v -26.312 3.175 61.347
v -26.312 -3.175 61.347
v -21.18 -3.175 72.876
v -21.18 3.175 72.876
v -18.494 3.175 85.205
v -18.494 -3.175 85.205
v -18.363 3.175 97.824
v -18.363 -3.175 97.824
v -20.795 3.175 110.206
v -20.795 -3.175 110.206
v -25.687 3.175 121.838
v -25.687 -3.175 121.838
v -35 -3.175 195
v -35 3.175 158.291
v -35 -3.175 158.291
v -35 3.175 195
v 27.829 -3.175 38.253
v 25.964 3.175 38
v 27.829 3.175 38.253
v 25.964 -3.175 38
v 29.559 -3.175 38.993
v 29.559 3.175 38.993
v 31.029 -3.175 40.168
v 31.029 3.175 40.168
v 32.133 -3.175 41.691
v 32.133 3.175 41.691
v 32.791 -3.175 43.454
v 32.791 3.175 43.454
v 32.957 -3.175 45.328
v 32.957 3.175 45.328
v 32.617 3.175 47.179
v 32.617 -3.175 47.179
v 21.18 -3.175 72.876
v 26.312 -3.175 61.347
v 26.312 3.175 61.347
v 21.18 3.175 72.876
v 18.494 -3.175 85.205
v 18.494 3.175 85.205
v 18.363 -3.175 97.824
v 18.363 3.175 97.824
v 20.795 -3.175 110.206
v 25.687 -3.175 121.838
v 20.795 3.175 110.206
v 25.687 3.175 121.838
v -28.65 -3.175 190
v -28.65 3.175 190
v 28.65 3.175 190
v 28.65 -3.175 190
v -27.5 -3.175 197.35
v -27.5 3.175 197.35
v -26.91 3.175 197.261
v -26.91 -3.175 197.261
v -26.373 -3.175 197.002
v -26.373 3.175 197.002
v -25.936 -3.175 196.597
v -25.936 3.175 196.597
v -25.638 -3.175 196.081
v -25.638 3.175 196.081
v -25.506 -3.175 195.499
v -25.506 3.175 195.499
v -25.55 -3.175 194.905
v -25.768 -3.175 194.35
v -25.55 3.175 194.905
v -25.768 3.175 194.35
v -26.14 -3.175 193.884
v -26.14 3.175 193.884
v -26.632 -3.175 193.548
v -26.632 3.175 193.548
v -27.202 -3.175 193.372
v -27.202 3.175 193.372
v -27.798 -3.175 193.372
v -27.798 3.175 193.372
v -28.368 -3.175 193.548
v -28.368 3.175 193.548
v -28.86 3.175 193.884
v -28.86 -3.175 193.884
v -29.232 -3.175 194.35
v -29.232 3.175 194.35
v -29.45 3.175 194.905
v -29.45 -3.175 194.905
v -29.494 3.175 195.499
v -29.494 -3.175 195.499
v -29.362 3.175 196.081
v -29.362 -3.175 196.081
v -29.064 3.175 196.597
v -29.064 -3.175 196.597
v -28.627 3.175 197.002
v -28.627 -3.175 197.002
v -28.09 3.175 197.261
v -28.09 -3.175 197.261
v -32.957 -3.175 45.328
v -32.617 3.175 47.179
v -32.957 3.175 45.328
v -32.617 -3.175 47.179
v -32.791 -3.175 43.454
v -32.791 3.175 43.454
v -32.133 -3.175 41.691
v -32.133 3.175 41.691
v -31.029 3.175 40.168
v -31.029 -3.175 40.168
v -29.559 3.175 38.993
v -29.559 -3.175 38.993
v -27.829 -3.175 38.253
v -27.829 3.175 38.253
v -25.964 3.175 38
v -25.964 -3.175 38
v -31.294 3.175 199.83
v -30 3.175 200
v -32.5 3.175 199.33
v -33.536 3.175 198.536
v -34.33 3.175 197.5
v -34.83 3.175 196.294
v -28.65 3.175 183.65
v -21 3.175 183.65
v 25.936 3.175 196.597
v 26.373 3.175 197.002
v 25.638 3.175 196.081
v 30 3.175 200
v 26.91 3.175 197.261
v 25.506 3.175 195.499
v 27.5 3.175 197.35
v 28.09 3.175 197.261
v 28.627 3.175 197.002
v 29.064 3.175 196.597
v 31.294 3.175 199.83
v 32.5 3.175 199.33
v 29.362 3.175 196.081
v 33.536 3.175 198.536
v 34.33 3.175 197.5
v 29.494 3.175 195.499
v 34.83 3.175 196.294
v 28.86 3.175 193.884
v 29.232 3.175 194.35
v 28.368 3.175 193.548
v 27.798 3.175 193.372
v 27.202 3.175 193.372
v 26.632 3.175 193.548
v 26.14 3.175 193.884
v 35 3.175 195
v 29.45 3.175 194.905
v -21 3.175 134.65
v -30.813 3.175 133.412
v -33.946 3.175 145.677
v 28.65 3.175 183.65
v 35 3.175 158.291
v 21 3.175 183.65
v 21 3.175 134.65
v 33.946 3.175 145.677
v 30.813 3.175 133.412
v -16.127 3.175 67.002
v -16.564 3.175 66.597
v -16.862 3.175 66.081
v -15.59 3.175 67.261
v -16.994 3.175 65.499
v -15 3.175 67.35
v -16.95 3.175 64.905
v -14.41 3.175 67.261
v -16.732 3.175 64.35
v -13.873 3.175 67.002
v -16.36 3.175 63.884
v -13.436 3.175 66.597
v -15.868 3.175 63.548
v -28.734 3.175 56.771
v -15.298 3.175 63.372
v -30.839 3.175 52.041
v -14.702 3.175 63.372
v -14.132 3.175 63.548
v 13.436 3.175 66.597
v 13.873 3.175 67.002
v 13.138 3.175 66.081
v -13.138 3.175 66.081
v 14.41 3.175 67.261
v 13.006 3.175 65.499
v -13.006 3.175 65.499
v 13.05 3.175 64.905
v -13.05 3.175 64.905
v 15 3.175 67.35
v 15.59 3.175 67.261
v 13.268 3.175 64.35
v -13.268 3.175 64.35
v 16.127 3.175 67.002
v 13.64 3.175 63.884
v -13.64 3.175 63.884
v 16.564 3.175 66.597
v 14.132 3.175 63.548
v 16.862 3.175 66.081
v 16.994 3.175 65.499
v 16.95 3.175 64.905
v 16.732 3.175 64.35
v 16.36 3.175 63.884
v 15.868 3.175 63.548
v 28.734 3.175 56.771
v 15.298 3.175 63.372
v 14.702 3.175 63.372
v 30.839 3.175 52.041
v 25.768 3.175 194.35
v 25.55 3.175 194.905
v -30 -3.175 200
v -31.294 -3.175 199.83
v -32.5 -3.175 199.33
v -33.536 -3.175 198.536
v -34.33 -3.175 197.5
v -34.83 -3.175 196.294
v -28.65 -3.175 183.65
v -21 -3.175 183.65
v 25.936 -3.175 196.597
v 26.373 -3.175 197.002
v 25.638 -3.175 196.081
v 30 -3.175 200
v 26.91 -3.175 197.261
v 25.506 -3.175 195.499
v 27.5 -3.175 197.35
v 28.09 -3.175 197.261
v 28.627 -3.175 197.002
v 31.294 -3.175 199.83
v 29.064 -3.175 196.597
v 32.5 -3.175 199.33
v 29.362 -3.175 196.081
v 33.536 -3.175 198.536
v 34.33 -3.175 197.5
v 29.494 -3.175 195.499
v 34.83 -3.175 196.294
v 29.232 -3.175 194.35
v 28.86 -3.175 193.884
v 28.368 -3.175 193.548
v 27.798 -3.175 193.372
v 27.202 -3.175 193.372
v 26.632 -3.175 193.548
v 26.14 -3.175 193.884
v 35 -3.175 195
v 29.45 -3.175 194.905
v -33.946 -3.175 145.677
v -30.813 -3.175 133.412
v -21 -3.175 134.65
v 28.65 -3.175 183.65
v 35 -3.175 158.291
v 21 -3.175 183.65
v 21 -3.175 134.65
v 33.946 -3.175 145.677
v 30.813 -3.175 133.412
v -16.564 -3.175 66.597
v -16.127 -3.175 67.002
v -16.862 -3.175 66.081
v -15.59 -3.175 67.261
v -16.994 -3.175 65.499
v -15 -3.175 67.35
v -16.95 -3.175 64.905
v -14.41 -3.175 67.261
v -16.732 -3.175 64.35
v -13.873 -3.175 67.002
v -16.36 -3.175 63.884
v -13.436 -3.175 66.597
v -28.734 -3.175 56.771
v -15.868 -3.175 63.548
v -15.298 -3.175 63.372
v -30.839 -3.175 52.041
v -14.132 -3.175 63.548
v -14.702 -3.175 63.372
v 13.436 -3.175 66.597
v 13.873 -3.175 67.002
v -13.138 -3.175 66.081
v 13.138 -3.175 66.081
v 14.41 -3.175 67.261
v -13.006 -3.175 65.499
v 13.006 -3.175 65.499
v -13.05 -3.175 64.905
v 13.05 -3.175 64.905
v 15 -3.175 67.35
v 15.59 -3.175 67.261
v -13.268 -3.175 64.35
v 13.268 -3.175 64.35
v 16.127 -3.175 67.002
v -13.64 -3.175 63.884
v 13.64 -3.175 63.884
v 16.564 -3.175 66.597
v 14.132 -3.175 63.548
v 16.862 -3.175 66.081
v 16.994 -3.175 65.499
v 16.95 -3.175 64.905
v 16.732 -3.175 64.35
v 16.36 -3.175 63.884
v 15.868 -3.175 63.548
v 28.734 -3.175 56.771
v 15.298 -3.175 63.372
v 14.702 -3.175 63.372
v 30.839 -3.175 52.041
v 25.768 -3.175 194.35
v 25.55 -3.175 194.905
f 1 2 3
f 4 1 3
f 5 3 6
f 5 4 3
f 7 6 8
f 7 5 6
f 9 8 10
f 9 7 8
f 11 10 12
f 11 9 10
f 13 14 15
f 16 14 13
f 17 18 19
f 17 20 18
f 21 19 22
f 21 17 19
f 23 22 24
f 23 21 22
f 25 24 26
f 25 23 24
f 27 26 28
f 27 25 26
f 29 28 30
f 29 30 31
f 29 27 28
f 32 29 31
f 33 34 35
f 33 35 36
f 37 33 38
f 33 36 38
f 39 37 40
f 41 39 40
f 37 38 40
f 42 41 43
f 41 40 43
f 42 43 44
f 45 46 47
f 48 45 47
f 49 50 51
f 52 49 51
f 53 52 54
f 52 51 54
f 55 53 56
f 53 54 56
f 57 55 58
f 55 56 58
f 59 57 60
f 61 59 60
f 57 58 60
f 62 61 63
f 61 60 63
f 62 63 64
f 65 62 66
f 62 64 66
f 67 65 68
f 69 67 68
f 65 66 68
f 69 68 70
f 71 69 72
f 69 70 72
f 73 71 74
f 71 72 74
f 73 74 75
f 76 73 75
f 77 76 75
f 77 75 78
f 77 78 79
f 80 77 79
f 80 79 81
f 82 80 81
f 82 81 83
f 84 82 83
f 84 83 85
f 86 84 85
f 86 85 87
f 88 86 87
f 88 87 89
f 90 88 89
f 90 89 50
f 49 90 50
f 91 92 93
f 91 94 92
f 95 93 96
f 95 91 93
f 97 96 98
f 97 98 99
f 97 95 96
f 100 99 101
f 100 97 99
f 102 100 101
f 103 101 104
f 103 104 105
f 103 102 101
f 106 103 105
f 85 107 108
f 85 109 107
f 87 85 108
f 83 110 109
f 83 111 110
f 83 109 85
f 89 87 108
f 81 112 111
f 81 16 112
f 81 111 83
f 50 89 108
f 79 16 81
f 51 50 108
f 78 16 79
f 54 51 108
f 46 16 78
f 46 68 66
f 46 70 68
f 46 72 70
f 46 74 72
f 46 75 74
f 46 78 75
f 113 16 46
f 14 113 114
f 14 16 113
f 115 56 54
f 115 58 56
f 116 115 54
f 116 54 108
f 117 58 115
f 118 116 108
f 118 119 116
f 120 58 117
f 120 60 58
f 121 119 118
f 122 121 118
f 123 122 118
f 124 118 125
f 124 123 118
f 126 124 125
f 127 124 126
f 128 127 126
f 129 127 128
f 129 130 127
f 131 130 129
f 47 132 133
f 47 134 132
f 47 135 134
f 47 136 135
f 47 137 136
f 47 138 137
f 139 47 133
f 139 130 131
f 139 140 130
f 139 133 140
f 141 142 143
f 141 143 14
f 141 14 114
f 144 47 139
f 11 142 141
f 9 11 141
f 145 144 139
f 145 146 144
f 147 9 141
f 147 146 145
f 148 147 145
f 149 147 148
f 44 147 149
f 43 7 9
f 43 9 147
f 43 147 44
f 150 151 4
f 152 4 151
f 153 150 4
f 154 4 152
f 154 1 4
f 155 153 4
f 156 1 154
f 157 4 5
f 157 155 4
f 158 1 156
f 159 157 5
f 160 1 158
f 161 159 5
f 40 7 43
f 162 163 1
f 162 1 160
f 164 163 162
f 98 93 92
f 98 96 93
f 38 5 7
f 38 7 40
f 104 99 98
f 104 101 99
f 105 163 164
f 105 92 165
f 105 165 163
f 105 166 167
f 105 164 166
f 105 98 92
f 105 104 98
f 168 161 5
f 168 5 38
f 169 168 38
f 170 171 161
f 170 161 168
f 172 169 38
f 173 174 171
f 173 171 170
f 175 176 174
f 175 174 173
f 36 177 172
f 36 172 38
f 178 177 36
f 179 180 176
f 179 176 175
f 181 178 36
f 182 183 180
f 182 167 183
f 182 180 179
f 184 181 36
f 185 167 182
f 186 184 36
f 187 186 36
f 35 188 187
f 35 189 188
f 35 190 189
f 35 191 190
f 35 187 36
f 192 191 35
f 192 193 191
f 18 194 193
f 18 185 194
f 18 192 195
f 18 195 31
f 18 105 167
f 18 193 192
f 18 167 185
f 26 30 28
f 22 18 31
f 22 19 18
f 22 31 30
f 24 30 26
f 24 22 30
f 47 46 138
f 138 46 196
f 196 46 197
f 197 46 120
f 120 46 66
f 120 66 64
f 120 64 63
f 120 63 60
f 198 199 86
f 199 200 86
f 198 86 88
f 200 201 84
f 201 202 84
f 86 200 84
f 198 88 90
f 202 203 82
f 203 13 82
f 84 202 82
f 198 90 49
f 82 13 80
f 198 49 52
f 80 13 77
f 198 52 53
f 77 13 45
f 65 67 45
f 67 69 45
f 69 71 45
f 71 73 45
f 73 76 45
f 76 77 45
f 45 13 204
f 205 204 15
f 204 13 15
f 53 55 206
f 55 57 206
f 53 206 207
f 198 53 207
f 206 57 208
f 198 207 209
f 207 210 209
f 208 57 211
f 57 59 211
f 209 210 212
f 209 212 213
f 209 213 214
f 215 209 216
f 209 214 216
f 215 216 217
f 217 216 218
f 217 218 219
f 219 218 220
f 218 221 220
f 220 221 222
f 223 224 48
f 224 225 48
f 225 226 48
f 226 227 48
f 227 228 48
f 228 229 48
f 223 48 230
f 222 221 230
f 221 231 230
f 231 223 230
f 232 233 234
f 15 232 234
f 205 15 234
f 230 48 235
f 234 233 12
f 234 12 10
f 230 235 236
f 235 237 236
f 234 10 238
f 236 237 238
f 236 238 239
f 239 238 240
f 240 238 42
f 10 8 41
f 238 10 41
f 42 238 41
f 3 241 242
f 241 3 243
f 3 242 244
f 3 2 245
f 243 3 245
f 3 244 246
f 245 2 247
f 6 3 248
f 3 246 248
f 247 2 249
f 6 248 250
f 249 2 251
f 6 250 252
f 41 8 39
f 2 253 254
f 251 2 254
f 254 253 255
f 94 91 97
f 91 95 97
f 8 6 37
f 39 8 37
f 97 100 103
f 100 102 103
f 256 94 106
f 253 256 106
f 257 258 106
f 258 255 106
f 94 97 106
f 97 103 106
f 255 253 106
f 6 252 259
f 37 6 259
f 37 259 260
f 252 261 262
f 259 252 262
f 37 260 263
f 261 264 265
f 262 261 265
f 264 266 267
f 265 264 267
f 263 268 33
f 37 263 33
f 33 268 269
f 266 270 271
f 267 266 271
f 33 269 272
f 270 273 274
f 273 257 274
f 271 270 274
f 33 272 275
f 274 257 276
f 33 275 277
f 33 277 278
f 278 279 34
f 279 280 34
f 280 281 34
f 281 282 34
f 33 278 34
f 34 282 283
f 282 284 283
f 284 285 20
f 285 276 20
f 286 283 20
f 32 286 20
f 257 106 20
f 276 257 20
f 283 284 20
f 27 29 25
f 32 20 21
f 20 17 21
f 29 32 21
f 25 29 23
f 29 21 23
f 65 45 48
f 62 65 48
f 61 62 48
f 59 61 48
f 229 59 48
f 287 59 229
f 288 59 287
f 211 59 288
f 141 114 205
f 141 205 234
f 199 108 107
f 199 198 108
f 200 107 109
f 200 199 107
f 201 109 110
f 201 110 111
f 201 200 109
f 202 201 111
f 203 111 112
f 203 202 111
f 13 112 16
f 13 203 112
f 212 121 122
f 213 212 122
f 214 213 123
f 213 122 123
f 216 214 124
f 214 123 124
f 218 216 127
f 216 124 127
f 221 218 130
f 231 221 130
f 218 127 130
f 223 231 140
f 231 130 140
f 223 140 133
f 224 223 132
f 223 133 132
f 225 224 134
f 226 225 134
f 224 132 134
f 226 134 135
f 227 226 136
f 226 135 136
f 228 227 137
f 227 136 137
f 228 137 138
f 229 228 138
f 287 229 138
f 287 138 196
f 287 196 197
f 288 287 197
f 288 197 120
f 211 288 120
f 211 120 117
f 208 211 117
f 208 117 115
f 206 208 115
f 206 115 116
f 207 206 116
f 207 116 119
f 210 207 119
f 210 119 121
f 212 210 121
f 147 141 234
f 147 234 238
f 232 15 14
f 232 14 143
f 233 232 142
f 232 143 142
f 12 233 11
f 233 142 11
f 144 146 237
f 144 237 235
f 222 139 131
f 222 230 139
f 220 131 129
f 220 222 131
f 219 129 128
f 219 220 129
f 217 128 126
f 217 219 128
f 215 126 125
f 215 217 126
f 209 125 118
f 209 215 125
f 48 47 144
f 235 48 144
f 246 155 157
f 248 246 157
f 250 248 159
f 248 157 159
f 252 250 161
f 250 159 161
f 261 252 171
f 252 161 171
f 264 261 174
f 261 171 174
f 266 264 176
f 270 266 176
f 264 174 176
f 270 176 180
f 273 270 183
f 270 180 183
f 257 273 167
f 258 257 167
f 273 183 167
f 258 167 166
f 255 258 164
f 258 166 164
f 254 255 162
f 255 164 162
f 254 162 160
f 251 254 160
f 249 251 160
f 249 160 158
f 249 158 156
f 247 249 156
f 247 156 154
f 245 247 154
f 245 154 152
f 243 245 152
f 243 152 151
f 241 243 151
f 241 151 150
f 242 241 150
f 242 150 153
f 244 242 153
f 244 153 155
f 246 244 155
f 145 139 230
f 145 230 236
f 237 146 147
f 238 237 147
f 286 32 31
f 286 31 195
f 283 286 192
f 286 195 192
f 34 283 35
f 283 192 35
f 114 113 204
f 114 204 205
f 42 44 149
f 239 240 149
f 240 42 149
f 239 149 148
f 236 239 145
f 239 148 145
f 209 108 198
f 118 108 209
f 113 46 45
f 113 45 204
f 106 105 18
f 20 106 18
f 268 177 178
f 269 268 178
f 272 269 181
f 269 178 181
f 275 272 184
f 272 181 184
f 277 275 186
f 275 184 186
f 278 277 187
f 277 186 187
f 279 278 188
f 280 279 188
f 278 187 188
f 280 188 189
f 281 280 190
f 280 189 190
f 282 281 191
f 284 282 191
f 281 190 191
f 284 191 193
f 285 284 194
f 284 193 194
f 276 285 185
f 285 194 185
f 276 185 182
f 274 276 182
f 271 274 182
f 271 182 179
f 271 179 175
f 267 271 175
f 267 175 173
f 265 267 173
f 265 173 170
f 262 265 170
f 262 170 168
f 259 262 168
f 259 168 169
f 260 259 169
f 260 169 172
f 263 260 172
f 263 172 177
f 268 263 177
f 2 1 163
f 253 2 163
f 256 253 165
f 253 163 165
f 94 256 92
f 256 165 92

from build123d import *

# Parameters (mm, degrees)
BOSS_EXTRUDE1_DEPTH = 3.175
CUT_EXTRUDE1_DEPTH  = 204.138678001
SKETCH3_W           = 42
SKETCH3_H           = 55.35
SKETCH3_W_2         = 7.65
SKETCH3_H_2         = 6.35
CUT_EXTRUDE2_DEPTH  = 204.138678001
FILLET3_R           = 5
SKETCH5_R           = 2
CUT_EXTRUDE4_DEPTH  = 204.138678001
CUT_EXTRUDE5_DEPTH  = 204.138678001
FILLET5_R           = 76
FILLET6_R           = 7


with BuildPart() as part:
    # Sketch1 → Boss-Extrude1 (new, symmetric)
    with BuildSketch(Plane(origin=(0, 0, 0), x_dir=(1, 0, 0), z_dir=(0, 1, 0))):
        with BuildLine():
            Line((35, -200), (35, 0))
            ThreePointArc((35, 0), (0, 35), (-35, 0))
            Line((-35, 0), (-35, -200))
            Line((-35, -200), (35, -200))
        make_face()
    extrude(amount=BOSS_EXTRUDE1_DEPTH, both=True)

    # Sketch2 → Cut-Extrude1 (cut, through all)
    with BuildSketch(Plane(origin=(0, 3.175, 0), x_dir=(1, 0, 0), z_dir=(0, 1, 0))):
        with BuildLine():
            Line((-35, -38), (35, -38))
            Line((35, -38), (35, 0))
            ThreePointArc((35, 0), (0, 35), (-35, 0))
            Line((-35, 0), (-35, -38))
        make_face()
    extrude(amount=-CUT_EXTRUDE1_DEPTH, mode=Mode.SUBTRACT)

    # Sketch3 → Cut-Extrude2 (cut, through all)
    with BuildSketch(Plane(origin=(0, 3.175, 0), x_dir=(1, 0, 0), z_dir=(0, 1, 0))):
        with Locations((0, -162.325)):
            Rectangle(SKETCH3_W, SKETCH3_H)
        with Locations((-24.825, -186.825)):
            Rectangle(SKETCH3_W_2, SKETCH3_H_2)
        with Locations((24.825, -186.825)):
            Rectangle(SKETCH3_W_2, SKETCH3_H_2)
    extrude(amount=-CUT_EXTRUDE2_DEPTH, mode=Mode.SUBTRACT)

    # Fillet3
    fillet3_edges = [part.edges().sort_by_distance(p)[0] for p in [
        (35, 0, 200),
        (-35, 0, 200),
    ]]
    fillet(fillet3_edges, radius=FILLET3_R)

    # Sketch5 → Cut-Extrude4 (cut, through all)
    with BuildSketch(Plane(origin=(0, 3.175, 0), x_dir=(1, 0, 0), z_dir=(0, 1, 0))):
        with Locations(Location((27.5, -195.35, 0), (0, 0, 270))):
            Circle(SKETCH5_R)
        with Locations(Location((-27.5, -195.35, 0), (0, 0, 270))):
            Circle(SKETCH5_R)
        with Locations(Location((15, -65.35, 0), (0, 0, 270))):
            Circle(SKETCH5_R)
        with Locations(Location((-15, -65.35, 0), (0, 0, 270))):
            Circle(SKETCH5_R)
    extrude(amount=-CUT_EXTRUDE4_DEPTH, mode=Mode.SUBTRACT)

    # Sketch6 → Cut-Extrude5 (cut, through all)
    with BuildSketch(Plane(origin=(0, 3.175, 0), x_dir=(1, 0, 0), z_dir=(0, 1, 0))):
        with BuildLine():
            Line((-35, -134.65), (-35, -49.65))
            ThreePointArc((-35, -49.65), (-18.102907984, -92.15), (-35, -134.65))
        make_face()
    cut_extrude5 = extrude(amount=-CUT_EXTRUDE5_DEPTH, mode=Mode.SUBTRACT)

    # Mirror1: Cut-Extrude5 across plane
    add(cut_extrude5.mirror(Plane(origin=(0, 0, 0), x_dir=(0, 0, 1), z_dir=(1, 0, 0))), mode=Mode.SUBTRACT)

    # Fillet5
    # the kernel refuses this fillet: 76 mm, written as the material it takes off along each edge
    with BuildSketch(Plane(origin=(-35, 39.601520625, 49.65), x_dir=(0, 0, -1), z_dir=(0, -1, 0))) as fillet5_piece_1:
        with BuildLine():
            CenterArc((26.124451555, 74.608915367), FILLET5_R, 240.155370723, 18.865389254)
            Line((-11.696928446, 8.688181035), (-12.453356046, 7.369766348))
            ThreePointArc((-12.453356046, 7.369766348), (-6.498269887, 3.469254885), (-1.04366777, -1.105059992))
            Line((-1.04366777, -1.105059992), (0, -1.52))
            ThreePointArc((0, -1.52), (5.825, -1.52), (11.360510969, -1.492178307))
            Line((11.360510969, -1.492178307), (11.65, 0))
        make_face()
    extrude(amount=79.20304125, mode=Mode.SUBTRACT)
    with BuildSketch(Plane(origin=(-35, 62.277048415, 134.65), x_dir=(0.587963491001448, 0, -0.8088874663693276), z_dir=(0, -1, 0))) as fillet5_piece_2:
        with BuildLine():
            CenterArc((25.562462836, 75.375386129), FILLET5_R, 233.987375861, 28.66182532)
            Line((-19.12276248, 13.899938684), (-20.016466986, 12.670429736))
            Line((-20.016466986, 12.670429736), (-0.893704506, -1.229508949))
            Line((-0.893704506, -1.229508949), (0.194474848, -1.507507723))
            ThreePointArc((0.194474848, -1.507507723), (7.919360226, -1.011292338), (15.644245604, -1.507507723))
            Line((15.644245604, -1.507507723), (15.838720451, 0))
        make_face()
    extrude(amount=124.554096829, mode=Mode.SUBTRACT)
    with BuildSketch(Plane(origin=(35, 62.277048415, 134.65), x_dir=(-0.587963491001448, 0, -0.8088874663693276), z_dir=(0, -1, 0))) as fillet5_piece_3:
        with BuildLine():
            CenterArc((25.562462836, -75.375386129), FILLET5_R, 97.350798819, 28.66182532)
            Line((-19.12276248, -13.899938684), (-20.016466986, -12.670429736))
            Line((-20.016466986, -12.670429736), (-0.893704506, 1.229508949))
            Line((-0.893704506, 1.229508949), (0.194474848, 1.507507723))
            ThreePointArc((0.194474848, 1.507507723), (7.919360226, 1.011292338), (15.644245604, 1.507507723))
            Line((15.644245604, 1.507507723), (15.838720451, 0))
        make_face()
    extrude(amount=124.554096829, mode=Mode.SUBTRACT)
    with BuildSketch(Plane(origin=(35, 39.601520625, 49.65), x_dir=(0, 0, -1), z_dir=(0, -1, 0))) as fillet5_piece_4:
        with BuildLine():
            CenterArc((26.124451555, -74.608915367), FILLET5_R, 100.979240023, 18.865389254)
            Line((-11.696928446, -8.688181035), (-12.453356046, -7.369766348))
            ThreePointArc((-12.453356046, -7.369766348), (-6.498269887, -3.469254885), (-1.04366777, 1.105059992))
            Line((-1.04366777, 1.105059992), (0, 1.52))
            ThreePointArc((0, 1.52), (5.825, 1.52), (11.360510969, 1.492178307))
            Line((11.360510969, 1.492178307), (11.65, 0))
        make_face()
    extrude(amount=79.20304125, mode=Mode.SUBTRACT)

    # Fillet6
    fillet6_edges = [part.edges().sort_by_distance(p)[0] for p in [
        (35, 0, 38),
        (-35, 0, 38),
    ]]
    fillet(fillet6_edges, radius=FILLET6_R)


solid = part.part
